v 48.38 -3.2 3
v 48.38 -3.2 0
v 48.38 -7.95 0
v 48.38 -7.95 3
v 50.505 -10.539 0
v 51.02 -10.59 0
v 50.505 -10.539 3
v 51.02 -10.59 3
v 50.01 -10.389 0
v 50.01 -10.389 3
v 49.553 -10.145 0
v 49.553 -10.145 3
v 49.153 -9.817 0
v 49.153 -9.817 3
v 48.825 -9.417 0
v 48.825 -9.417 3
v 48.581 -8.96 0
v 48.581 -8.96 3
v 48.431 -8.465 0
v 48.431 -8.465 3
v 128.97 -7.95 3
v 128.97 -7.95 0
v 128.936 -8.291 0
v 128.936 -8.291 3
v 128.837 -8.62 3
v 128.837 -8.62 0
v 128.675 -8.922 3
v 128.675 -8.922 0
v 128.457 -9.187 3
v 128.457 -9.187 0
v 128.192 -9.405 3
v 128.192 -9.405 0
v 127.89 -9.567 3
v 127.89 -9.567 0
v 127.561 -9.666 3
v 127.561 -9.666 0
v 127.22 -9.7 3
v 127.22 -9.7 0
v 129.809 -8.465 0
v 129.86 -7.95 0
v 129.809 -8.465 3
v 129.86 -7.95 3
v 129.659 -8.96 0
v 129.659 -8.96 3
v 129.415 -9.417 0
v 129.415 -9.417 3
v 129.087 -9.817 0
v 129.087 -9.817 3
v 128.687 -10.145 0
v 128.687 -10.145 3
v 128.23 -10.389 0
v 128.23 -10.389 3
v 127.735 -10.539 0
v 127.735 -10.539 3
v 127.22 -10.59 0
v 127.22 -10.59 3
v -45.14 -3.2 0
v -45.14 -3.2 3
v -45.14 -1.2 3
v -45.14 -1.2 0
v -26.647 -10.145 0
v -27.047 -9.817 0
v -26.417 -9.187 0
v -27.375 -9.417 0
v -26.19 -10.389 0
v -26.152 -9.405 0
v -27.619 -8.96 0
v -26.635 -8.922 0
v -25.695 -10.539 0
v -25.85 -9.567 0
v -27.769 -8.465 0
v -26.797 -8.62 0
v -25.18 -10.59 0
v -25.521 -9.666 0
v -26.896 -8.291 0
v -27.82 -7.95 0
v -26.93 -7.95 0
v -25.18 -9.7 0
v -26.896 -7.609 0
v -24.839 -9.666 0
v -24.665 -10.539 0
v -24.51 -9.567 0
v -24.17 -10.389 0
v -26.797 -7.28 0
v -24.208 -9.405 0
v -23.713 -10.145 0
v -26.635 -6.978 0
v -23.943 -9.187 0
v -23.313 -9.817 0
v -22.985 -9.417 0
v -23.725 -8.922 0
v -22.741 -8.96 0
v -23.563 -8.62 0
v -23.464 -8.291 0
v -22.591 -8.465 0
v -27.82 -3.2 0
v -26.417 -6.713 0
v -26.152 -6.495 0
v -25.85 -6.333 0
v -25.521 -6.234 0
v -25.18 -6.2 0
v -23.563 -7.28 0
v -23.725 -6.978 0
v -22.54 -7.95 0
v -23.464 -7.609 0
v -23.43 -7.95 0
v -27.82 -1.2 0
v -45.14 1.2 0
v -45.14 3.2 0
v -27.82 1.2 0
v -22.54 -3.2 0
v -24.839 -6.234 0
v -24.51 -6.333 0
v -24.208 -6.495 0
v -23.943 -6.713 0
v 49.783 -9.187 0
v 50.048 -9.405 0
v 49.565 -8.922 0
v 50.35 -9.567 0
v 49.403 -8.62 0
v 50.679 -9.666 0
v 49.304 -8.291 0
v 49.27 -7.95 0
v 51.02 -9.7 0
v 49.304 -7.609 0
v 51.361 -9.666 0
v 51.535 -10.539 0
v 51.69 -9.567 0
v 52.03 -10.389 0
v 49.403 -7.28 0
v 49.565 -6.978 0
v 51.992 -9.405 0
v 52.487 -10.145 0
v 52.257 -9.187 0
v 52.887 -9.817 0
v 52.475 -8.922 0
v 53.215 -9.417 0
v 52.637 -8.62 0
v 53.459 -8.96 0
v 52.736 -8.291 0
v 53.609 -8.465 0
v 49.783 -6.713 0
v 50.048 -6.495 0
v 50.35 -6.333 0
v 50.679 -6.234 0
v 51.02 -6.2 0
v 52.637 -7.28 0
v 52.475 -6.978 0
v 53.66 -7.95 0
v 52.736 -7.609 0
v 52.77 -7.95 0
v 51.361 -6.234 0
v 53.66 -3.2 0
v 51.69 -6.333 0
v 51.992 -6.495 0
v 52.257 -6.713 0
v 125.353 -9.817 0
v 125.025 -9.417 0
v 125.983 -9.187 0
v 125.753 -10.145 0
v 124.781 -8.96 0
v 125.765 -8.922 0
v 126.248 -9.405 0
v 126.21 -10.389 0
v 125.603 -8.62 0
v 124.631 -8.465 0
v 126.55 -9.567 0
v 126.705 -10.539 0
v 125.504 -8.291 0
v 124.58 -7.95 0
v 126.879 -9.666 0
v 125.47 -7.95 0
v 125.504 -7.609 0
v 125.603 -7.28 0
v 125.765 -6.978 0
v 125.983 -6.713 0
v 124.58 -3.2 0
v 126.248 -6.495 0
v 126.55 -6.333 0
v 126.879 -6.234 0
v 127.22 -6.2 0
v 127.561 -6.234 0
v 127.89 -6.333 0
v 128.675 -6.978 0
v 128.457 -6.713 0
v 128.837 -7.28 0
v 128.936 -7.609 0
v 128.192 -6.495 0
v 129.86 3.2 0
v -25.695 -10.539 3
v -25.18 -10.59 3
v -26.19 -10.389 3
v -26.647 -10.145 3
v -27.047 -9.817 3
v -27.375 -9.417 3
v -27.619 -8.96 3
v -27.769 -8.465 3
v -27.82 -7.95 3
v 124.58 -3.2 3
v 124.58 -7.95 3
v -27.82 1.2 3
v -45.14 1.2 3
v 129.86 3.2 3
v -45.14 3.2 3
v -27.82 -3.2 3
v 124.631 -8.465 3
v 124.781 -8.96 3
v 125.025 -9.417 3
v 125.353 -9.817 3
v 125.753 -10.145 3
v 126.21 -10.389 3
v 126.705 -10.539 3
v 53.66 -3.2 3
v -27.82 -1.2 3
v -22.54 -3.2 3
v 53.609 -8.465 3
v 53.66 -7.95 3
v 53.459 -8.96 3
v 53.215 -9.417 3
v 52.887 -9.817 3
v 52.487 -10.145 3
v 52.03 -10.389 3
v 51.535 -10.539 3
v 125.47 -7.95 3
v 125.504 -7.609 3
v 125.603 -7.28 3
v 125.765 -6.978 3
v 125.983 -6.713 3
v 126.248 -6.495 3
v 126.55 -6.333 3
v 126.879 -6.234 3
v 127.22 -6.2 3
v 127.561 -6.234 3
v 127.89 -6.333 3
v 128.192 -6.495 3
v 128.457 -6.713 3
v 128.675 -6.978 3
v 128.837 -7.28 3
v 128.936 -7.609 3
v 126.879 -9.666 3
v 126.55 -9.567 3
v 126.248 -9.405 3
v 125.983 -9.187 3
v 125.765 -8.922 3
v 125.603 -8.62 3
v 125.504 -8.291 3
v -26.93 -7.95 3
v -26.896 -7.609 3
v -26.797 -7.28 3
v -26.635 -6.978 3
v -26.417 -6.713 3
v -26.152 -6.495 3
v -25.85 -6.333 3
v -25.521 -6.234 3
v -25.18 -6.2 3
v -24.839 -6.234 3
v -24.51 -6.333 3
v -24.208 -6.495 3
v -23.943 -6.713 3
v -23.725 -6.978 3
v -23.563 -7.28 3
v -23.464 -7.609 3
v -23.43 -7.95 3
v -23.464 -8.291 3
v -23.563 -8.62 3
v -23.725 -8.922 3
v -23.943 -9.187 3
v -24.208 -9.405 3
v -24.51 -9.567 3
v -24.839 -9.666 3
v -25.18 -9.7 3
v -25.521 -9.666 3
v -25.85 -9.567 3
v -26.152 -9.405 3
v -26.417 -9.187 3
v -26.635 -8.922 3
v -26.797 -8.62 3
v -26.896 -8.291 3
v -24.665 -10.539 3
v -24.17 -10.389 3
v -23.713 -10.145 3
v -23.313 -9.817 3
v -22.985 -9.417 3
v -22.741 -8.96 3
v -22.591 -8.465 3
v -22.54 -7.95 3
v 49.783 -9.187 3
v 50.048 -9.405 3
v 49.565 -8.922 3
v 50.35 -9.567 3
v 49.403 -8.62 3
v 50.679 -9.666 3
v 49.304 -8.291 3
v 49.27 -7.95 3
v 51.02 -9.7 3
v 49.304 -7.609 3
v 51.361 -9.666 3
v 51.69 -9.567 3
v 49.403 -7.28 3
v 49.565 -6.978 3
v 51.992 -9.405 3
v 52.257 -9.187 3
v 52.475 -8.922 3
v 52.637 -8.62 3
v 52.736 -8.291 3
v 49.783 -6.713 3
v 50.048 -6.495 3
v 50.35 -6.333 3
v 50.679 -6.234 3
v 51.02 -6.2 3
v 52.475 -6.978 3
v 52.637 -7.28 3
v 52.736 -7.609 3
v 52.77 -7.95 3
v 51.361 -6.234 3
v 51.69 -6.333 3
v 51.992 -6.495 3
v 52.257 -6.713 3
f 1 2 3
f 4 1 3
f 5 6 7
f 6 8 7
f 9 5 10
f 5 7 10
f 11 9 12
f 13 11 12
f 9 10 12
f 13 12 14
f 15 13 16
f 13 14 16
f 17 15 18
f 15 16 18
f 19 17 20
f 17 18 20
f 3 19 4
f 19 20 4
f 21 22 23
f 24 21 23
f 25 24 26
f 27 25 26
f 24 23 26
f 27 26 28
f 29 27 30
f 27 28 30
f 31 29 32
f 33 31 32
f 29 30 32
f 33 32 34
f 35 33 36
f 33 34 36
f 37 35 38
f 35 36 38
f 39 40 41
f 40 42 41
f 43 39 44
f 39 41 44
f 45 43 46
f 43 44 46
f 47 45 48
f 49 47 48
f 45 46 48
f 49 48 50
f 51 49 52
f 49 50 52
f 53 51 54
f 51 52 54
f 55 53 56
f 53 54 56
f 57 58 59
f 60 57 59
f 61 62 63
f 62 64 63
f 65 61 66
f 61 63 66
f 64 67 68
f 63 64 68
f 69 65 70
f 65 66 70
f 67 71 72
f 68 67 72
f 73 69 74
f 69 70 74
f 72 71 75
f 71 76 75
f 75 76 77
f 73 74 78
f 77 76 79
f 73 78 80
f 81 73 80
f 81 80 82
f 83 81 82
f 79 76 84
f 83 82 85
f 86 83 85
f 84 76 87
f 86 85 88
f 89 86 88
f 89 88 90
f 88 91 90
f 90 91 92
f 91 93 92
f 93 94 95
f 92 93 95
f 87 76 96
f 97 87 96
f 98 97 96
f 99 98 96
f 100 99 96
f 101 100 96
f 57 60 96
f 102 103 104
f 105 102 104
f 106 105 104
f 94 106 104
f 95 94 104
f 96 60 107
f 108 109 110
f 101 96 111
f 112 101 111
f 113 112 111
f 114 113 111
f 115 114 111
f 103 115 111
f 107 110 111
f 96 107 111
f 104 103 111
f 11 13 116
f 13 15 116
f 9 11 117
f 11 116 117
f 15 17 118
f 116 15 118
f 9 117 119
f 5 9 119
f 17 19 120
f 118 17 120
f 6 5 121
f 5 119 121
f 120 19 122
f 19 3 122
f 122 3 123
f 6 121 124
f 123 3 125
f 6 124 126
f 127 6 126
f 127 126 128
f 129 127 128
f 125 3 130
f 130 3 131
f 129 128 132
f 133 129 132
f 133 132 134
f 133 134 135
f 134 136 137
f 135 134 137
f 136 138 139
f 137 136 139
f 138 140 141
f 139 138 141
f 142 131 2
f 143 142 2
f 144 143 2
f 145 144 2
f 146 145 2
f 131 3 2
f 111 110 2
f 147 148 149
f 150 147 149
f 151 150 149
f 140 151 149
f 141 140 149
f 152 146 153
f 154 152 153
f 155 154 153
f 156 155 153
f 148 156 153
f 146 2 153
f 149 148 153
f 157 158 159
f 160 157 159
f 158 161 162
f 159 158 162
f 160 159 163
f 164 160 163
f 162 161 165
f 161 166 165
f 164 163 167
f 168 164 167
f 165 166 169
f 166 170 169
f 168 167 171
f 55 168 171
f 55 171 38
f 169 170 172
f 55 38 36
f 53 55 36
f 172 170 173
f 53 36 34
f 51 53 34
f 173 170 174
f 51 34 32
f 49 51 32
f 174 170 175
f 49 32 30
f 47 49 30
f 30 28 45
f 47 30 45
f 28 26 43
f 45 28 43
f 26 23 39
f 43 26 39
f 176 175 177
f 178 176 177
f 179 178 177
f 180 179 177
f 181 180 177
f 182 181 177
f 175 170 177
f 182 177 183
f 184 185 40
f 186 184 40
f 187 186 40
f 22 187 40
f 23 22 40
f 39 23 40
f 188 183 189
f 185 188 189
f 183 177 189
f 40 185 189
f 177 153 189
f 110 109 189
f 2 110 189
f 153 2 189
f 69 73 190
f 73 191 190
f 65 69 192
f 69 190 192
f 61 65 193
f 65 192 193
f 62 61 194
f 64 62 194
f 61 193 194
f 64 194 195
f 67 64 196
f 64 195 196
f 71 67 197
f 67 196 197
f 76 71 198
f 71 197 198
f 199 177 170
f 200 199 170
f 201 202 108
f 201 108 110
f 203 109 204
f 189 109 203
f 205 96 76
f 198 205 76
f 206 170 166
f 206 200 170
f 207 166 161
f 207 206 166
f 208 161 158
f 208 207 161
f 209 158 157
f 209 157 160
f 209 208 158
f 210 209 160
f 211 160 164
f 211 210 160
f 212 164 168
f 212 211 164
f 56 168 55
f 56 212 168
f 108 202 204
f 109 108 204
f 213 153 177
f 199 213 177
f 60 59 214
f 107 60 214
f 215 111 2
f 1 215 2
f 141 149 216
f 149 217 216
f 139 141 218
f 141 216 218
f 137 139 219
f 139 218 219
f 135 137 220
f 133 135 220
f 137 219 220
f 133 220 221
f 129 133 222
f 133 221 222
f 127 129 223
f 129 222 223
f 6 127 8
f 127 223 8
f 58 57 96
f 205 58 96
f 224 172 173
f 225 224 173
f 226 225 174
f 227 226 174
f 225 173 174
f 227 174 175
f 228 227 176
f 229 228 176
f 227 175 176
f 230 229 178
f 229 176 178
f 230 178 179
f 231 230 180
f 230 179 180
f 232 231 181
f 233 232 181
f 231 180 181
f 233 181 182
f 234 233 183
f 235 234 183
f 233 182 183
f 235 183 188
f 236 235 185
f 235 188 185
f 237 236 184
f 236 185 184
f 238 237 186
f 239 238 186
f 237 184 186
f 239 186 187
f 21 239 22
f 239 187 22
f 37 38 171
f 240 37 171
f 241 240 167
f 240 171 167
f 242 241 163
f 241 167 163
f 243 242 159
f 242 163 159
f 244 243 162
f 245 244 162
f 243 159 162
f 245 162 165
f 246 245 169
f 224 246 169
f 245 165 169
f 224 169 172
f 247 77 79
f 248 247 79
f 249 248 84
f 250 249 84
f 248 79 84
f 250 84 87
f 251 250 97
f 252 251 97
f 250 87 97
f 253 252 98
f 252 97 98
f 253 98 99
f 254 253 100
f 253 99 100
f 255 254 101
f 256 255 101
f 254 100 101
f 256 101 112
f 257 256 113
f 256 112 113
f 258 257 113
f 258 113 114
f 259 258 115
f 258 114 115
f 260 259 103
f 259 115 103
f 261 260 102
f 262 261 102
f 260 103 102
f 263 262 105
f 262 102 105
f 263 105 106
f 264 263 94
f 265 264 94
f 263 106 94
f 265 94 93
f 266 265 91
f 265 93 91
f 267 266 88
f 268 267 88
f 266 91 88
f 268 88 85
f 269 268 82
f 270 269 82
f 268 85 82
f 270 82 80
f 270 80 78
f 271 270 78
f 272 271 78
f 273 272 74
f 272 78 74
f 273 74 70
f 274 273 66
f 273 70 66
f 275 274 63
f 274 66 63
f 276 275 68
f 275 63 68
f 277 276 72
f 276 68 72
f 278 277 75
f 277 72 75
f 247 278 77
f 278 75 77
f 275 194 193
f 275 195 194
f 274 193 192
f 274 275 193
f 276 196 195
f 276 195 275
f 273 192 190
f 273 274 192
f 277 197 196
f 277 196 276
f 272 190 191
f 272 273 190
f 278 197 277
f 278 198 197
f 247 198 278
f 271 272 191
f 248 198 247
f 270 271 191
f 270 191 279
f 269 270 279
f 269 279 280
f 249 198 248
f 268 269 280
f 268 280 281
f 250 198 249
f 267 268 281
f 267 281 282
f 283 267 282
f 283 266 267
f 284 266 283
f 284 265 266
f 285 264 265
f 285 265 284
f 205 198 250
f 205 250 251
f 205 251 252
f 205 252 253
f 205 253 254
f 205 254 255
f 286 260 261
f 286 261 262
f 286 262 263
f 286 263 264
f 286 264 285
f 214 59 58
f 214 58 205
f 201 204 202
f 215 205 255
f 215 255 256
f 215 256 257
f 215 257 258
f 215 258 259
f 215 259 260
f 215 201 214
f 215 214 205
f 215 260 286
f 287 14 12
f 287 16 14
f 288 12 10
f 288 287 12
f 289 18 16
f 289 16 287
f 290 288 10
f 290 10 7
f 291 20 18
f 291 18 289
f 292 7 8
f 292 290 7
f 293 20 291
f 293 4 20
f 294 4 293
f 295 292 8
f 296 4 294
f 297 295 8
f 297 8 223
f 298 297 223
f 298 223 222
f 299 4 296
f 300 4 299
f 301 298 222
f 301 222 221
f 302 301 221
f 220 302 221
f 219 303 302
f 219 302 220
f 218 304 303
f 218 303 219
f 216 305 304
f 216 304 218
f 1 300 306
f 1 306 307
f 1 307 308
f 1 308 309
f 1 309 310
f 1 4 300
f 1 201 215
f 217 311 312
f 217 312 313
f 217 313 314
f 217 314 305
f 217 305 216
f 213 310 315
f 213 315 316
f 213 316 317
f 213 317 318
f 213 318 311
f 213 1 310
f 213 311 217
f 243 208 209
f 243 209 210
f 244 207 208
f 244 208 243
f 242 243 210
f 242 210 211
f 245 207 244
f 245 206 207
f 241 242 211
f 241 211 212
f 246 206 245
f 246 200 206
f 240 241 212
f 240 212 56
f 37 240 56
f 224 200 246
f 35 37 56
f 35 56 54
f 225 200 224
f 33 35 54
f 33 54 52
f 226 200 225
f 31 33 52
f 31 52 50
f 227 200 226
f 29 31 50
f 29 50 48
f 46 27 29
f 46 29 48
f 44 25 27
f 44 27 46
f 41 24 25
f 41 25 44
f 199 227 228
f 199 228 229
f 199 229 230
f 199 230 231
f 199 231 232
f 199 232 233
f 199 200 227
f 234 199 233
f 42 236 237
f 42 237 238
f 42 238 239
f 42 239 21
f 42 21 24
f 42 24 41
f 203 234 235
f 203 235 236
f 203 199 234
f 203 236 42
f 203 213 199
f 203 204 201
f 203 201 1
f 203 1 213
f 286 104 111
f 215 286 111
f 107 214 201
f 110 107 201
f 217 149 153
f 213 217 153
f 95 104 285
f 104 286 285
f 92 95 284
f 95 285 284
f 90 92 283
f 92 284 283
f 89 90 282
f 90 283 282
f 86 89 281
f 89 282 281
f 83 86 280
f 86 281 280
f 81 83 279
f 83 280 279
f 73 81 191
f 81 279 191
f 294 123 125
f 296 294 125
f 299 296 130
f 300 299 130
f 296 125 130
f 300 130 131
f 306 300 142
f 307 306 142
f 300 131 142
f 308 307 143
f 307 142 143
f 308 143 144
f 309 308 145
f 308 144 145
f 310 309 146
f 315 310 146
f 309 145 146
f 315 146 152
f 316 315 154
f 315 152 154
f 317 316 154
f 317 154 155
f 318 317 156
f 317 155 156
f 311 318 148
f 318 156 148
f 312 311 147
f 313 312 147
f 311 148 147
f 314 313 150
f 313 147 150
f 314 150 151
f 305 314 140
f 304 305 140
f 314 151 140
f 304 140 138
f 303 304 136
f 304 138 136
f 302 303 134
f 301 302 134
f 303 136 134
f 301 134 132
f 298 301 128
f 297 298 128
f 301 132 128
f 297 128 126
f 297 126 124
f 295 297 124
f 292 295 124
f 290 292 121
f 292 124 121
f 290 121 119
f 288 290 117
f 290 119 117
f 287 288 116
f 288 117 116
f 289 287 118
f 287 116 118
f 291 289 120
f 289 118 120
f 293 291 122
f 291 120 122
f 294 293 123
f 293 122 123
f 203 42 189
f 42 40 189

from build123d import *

# Parameters (mm, degrees)
F0_W     = 259.72
F0_H     = 6.4
F1_DEPTH = 3
F3_DEPTH = 3
F4_R     = 2.63999
F5_W     = 17.32
F5_H     = 2.4
F6_DEPTH = 3.001


# Not quite as in the source:
# - a fillet or chamfer is up to 0.001 mm smaller than in the source, because OpenCascade refuses the exact size


with BuildPart() as f1:
    # F0 (on Top) → F1 (new body)
    with BuildSketch(Plane.XY):
        Rectangle(F0_W, F0_H)
    extrude(amount=F1_DEPTH)

    # F2 (on Top) → F3 (join)
    with BuildSketch(Plane.XY):
        with BuildLine():
            Line((129.86, -10.59), (129.86, -3.2))
            Line((129.86, -3.2), (124.58, -3.2))
            Line((124.58, -3.2), (124.58, -7.95))
            Line((124.58, -7.95), (125.47, -7.95))
            ThreePointArc((125.47, -7.95), (127.22, -6.2), (128.97, -7.95))
            ThreePointArc((128.97, -7.95), (128.4574368671, -9.1874368671), (127.22, -9.7))
            Line((127.22, -9.7), (127.22, -10.59))
            Line((127.22, -10.59), (129.86, -10.59))
        make_face()
        with BuildLine():
            Line((125.47, -7.95), (124.58, -7.95))
            Line((124.58, -7.95), (124.58, -10.59))
            Line((124.58, -10.59), (127.22, -10.59))
            Line((127.22, -10.59), (127.22, -9.7))
            ThreePointArc((127.22, -9.7), (125.9825631329, -9.1874368671), (125.47, -7.95))
        make_face()
        Polygon((53.66, -10.59), (53.66, -3.2), (48.38, -3.2), (48.38, -7.95), (48.38, -10.59), align=None)
        with BuildLine():
            ThreePointArc((52.77, -7.95), (51.02, -9.7), (49.27, -7.95))
            ThreePointArc((49.27, -7.95), (51.02, -6.2), (52.77, -7.95))
        make_face(mode=Mode.SUBTRACT)
        Polygon((-22.54, -3.2), (-27.82, -3.2), (-27.82, -7.95), (-27.82, -10.59), (-22.54, -10.59), align=None)
        with BuildLine():
            ThreePointArc((-23.43, -7.95), (-25.18, -9.7), (-26.93, -7.95))
            ThreePointArc((-26.93, -7.95), (-25.18, -6.2), (-23.43, -7.95))
        make_face(mode=Mode.SUBTRACT)
    extrude(amount=F3_DEPTH)

    # F4 (radius 2.64 in the source; OpenCascade refuses exactly that, so slightly less here)
    f4_edges = [f1.edges().sort_by_distance(p)[0] for p in [
        (48.38, -10.59, 1.5),
        (53.66, -10.59, 1.5),
        (124.58, -10.59, 1.5),
        (129.86, -10.59, 1.5),
        (-27.82, -10.59, 1.5),
        (-22.54, -10.59, 1.5),
    ]]
    fillet(f4_edges, radius=F4_R)

    # F5 (on face) → F6 (cut, through all)
    with BuildSketch(Plane.XY.offset(3)):
        Polygon((-45.14, 3.2), (-129.86, 3.2), (-129.86, -3.2), (-45.14, -3.2), (-45.14, -1.2), (-45.14, 1.2), align=None)
        with Locations((-36.48, 0)):
            Rectangle(F5_W, F5_H)
    extrude(amount=-F6_DEPTH, mode=Mode.SUBTRACT)


solid = f1.part
